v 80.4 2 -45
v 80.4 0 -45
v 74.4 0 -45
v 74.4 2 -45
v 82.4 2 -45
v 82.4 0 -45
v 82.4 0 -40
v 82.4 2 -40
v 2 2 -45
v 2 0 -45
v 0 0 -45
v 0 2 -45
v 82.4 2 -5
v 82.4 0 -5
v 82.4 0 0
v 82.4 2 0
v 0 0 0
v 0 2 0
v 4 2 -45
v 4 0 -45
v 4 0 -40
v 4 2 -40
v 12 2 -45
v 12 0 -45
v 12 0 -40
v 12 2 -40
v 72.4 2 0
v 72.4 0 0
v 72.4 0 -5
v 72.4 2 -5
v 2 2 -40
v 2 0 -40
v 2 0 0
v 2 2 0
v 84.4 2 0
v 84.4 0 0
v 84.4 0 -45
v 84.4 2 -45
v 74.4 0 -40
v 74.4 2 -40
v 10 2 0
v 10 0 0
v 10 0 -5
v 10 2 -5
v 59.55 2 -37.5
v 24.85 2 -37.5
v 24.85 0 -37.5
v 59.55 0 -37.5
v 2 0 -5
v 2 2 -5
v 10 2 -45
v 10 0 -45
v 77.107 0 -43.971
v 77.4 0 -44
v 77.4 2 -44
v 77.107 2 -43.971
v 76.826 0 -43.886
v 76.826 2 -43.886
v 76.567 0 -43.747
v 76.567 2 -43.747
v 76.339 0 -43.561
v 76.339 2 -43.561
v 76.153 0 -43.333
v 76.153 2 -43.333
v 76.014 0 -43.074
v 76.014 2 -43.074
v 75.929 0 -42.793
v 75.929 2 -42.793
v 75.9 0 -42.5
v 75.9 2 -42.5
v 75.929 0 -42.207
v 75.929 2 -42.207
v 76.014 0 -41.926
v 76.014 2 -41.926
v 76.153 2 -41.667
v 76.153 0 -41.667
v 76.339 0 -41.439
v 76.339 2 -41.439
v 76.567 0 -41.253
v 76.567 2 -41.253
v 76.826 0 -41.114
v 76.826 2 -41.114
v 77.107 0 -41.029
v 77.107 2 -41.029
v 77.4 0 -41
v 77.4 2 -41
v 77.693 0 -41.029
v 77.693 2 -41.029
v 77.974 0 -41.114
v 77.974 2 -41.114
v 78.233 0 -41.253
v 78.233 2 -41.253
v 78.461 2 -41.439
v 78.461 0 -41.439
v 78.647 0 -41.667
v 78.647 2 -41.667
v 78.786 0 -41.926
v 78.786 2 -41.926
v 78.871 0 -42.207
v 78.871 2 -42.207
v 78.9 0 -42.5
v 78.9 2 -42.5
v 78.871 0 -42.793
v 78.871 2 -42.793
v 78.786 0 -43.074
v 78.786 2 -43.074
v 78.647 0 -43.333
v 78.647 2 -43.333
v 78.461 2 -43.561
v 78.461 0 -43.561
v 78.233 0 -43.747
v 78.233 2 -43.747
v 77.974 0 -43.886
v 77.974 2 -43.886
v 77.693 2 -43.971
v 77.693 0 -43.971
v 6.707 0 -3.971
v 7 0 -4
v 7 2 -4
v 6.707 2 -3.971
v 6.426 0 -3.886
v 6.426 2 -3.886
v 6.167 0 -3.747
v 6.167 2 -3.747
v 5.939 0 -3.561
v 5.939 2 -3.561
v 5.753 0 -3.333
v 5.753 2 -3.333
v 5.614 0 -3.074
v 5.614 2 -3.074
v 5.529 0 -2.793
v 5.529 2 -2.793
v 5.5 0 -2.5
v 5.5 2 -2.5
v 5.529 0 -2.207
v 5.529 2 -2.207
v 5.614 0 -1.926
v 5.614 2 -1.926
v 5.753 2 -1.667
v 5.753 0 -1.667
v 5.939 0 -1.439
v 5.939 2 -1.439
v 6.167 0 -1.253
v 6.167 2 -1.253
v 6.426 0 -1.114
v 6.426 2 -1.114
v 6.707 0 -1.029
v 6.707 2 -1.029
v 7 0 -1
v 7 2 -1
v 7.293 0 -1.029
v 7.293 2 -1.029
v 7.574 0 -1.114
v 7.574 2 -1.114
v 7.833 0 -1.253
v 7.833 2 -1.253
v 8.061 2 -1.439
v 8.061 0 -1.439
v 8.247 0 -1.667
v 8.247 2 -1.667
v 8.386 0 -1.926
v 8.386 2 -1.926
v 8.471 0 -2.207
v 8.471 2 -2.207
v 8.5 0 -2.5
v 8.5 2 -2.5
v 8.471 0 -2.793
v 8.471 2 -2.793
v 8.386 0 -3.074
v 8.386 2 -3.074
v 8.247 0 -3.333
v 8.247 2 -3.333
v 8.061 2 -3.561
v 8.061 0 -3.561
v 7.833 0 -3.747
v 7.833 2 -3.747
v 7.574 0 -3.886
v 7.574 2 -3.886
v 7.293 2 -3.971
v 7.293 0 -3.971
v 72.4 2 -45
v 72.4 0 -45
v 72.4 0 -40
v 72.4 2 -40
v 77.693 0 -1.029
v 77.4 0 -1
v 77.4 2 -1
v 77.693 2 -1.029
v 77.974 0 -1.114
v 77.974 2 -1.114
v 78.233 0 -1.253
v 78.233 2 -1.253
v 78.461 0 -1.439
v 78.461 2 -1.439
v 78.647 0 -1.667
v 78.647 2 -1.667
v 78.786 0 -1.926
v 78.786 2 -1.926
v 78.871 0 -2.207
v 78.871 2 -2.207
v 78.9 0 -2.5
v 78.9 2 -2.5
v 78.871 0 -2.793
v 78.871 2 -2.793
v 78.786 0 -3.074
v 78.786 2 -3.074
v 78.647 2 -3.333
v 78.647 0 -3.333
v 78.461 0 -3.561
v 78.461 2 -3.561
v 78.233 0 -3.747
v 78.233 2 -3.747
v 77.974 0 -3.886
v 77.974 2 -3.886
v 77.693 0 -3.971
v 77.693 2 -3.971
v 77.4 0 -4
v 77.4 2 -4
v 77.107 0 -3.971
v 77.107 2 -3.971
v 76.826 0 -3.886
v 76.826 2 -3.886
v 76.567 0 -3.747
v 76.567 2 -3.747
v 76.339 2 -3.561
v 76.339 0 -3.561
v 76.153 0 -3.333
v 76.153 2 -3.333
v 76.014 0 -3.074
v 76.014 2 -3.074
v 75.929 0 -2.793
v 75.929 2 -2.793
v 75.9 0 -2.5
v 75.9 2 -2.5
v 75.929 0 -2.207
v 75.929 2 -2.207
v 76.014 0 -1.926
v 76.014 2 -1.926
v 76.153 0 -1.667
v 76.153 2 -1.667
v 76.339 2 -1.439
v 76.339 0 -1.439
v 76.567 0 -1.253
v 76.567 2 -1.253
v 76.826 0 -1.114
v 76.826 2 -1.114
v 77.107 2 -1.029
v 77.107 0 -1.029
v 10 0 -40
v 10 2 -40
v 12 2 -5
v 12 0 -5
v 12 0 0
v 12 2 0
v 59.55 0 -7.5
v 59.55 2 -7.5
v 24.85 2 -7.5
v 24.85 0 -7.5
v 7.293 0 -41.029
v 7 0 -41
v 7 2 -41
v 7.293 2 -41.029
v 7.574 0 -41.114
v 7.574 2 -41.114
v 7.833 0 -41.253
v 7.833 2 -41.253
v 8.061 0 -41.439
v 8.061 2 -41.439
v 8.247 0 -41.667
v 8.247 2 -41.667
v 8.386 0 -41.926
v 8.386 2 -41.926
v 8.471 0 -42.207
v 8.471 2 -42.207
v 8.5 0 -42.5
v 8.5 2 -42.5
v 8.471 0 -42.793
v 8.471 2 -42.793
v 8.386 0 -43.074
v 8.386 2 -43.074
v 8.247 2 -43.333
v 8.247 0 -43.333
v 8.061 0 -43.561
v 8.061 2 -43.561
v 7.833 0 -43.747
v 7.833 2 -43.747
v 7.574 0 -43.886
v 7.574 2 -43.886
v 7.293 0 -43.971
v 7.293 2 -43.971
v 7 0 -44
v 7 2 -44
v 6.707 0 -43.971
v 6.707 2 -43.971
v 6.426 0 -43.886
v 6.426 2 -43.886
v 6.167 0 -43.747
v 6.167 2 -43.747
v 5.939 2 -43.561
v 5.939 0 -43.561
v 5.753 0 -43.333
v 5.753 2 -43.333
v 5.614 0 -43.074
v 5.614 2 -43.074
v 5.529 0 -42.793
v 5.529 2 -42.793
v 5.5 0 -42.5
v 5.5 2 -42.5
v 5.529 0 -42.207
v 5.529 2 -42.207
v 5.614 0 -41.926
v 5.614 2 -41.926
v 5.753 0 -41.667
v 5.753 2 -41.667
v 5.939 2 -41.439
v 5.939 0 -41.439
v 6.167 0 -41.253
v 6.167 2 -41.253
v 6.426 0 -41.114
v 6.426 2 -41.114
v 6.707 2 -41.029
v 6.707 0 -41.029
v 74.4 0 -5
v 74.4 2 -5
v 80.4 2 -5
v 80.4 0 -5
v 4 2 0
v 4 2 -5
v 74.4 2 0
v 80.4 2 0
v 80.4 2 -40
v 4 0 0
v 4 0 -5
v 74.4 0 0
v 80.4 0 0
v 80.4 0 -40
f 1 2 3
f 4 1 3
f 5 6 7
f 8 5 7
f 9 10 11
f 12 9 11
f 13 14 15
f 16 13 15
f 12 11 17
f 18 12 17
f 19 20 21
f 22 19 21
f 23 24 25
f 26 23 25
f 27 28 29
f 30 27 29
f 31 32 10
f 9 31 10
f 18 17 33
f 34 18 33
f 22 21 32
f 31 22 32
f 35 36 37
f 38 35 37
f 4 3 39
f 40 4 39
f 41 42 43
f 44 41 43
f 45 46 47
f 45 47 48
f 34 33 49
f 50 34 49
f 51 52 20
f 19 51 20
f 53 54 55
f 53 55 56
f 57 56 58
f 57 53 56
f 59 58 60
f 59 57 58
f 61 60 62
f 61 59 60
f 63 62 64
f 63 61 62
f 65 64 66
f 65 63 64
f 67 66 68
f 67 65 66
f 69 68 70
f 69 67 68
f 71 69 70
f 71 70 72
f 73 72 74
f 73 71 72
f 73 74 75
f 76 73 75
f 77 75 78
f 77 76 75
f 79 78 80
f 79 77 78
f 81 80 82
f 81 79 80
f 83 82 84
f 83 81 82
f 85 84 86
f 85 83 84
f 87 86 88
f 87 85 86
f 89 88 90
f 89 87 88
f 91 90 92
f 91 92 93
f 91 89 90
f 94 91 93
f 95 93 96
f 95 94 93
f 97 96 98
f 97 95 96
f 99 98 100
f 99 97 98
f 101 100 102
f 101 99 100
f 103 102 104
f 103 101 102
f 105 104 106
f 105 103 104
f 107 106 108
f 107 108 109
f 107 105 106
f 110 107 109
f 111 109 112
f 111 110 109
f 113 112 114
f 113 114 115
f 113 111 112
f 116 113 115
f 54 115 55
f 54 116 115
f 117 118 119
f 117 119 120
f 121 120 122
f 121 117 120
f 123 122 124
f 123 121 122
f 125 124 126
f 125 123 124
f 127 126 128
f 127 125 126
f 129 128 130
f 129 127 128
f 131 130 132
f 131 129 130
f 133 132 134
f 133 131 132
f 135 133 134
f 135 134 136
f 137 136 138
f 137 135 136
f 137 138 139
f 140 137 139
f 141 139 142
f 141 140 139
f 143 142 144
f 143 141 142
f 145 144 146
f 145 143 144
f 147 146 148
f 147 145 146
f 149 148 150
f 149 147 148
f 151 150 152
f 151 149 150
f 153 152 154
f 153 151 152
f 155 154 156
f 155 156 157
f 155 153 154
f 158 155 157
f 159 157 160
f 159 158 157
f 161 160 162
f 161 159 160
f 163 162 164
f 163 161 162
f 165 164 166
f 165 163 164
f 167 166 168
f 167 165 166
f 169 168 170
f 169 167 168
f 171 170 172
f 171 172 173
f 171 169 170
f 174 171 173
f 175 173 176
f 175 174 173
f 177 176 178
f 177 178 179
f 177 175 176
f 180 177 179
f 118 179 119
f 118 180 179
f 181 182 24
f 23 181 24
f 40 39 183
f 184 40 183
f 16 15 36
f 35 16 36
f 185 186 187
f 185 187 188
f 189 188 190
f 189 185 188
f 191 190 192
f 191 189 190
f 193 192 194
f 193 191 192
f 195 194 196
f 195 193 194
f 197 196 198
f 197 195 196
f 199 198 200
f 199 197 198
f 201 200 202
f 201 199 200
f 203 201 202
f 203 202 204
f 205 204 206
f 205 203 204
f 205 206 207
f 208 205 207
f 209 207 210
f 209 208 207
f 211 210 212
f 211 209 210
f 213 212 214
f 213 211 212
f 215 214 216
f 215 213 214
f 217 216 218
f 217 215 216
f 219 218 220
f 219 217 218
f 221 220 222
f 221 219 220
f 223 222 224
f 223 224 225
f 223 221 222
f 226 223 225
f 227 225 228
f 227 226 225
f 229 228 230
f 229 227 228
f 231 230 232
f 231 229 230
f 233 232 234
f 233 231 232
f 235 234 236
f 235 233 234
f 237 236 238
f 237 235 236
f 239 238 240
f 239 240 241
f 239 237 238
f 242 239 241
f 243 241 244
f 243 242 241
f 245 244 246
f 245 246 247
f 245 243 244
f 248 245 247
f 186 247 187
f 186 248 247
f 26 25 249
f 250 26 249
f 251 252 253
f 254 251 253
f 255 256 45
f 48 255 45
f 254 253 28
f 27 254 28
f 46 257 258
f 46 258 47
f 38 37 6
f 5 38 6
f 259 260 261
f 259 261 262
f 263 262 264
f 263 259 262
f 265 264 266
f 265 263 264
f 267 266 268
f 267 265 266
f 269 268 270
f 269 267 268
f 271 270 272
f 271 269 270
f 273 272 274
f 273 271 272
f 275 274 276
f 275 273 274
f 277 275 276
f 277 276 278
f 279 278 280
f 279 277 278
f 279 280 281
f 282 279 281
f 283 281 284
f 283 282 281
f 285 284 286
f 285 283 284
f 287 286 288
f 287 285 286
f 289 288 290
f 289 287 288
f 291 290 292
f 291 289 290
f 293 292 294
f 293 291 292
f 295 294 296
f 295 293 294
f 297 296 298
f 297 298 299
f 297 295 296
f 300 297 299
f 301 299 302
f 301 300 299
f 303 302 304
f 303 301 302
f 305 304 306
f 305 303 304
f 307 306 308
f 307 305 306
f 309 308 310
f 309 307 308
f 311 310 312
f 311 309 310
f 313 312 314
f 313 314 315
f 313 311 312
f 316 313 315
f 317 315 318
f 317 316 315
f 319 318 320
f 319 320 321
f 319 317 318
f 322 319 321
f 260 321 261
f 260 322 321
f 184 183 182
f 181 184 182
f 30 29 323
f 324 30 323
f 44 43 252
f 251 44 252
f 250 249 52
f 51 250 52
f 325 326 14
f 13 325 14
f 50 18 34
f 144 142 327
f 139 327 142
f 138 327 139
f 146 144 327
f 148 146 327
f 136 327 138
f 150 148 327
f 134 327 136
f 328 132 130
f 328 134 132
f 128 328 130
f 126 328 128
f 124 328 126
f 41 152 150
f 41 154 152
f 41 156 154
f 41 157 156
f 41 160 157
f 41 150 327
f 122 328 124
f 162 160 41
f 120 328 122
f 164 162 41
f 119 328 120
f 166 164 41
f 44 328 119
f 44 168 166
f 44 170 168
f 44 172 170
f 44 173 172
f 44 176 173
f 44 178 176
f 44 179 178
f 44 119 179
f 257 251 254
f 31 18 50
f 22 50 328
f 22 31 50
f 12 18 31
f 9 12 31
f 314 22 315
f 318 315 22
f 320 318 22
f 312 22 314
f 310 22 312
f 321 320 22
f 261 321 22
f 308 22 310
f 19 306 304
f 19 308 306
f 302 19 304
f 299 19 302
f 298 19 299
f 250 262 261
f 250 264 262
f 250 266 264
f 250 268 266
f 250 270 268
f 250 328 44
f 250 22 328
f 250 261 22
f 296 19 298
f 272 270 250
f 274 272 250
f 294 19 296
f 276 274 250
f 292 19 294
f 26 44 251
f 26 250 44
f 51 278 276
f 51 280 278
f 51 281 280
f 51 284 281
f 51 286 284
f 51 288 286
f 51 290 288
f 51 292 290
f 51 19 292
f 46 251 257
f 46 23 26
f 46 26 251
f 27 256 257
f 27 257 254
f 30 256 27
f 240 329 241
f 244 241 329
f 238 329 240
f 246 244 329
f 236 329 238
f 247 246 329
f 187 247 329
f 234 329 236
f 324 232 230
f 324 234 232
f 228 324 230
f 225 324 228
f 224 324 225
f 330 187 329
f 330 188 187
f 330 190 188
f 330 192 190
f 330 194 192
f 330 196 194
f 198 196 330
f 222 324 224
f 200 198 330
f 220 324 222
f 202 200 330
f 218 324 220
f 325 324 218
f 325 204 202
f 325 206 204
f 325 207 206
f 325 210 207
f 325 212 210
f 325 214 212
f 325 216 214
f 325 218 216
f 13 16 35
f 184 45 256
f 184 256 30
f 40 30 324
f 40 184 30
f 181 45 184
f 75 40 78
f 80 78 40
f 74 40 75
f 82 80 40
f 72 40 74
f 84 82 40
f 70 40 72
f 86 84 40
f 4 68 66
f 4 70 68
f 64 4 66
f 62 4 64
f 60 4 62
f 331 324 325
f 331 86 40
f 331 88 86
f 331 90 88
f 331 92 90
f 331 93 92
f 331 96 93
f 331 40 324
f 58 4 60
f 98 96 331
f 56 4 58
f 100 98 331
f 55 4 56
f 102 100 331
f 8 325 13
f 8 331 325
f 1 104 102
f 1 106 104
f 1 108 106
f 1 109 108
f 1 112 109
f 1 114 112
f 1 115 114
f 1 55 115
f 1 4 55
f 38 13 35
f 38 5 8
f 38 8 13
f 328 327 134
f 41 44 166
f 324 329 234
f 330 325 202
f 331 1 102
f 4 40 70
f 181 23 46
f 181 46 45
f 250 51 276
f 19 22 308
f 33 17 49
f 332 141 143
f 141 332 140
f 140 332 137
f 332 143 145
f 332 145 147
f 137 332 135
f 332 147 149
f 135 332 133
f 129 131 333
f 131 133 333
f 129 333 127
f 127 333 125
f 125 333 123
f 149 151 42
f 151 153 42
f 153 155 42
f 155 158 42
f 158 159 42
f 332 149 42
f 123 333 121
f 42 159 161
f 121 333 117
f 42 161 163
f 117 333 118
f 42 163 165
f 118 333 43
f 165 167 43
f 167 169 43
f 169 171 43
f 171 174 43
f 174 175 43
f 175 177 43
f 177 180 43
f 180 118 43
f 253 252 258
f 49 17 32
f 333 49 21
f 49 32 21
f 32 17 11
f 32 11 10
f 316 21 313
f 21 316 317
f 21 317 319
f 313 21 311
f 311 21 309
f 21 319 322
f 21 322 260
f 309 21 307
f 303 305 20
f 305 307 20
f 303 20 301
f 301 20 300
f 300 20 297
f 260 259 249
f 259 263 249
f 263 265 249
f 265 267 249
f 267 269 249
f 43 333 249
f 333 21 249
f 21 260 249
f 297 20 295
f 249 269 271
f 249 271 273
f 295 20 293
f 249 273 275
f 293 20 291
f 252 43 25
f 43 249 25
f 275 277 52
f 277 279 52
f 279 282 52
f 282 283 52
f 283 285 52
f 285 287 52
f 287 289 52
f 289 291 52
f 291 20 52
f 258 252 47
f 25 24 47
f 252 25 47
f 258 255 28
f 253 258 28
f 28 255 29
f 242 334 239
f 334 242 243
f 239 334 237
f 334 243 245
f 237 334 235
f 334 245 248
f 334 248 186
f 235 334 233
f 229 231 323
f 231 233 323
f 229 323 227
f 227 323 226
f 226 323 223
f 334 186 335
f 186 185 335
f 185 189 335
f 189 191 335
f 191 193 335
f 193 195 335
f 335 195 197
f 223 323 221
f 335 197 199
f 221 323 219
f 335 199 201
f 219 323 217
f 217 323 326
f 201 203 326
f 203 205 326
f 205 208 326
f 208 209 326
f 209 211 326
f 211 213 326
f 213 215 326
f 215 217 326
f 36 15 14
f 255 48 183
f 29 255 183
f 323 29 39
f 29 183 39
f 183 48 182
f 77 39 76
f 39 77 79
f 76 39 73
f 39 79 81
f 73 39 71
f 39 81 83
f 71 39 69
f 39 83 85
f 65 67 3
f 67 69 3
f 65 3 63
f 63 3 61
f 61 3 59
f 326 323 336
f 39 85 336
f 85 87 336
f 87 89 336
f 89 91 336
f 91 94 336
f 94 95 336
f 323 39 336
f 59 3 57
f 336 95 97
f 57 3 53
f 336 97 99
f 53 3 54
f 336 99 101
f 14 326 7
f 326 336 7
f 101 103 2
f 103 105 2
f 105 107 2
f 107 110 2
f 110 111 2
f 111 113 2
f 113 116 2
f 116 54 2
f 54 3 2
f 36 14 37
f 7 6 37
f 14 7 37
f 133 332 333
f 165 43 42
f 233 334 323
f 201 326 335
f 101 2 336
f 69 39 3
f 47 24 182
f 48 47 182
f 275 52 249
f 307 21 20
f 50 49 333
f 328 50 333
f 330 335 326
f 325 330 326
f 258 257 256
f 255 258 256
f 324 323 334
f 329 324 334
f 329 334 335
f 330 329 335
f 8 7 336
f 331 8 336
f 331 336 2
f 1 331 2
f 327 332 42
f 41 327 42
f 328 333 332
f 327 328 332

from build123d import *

# Parameters (mm, degrees)
SKETCH1_R           = 1.5
BOSS_EXTRUDE1_DEPTH = 2
SKETCH2_W           = 34.7
SKETCH2_H           = 30
CUT_EXTRUDE1_DEPTH  = 10


with BuildPart() as part:
    # Sketch1 → Boss-Extrude1 (new body)
    with BuildSketch(Plane(origin=(0, 0, 0), x_dir=(1, 0, 0), z_dir=(0, 1, 0))):
        Polygon((0, 0), (2, 0), (2, 5), (4, 5), (4, 0), (10, 0), (10, 5), (12, 5), (12, 0), (72.4, 0), (72.4, 5), (74.4, 5), (74.4, 0), (80.4, 0), (80.4, 5), (82.4, 5), (82.4, 0), (84.4, 0), (84.4, 45), (82.4, 45), (82.4, 40), (80.4, 40), (80.4, 45), (74.4, 45), (74.4, 40), (72.4, 40), (72.4, 45), (12, 45), (12, 40), (10, 40), (10, 45), (4, 45), (4, 40), (2, 40), (2, 45), (0, 45), align=None)
        with Locations(Location((7, 42.5, 0), (0, 0, 270))):
            Circle(SKETCH1_R, mode=Mode.SUBTRACT)
        with Locations(Location((77.4, 42.5, 0), (0, 0, 90))):
            Circle(SKETCH1_R, mode=Mode.SUBTRACT)
        with Locations(Location((7, 2.5, 0), (0, 0, 90))):
            Circle(SKETCH1_R, mode=Mode.SUBTRACT)
        with Locations(Location((77.4, 2.5, 0), (0, 0, 270))):
            Circle(SKETCH1_R, mode=Mode.SUBTRACT)
    extrude(amount=BOSS_EXTRUDE1_DEPTH)

    # Sketch2 → Cut-Extrude1 (cut)
    with BuildSketch(Plane(origin=(0, 2, 0), x_dir=(1, 0, 0), z_dir=(0, 1, 0))):
        with Locations((42.2, 22.5)):
            Rectangle(SKETCH2_W, SKETCH2_H)
    extrude(amount=-CUT_EXTRUDE1_DEPTH, mode=Mode.SUBTRACT)


solid = part.part
